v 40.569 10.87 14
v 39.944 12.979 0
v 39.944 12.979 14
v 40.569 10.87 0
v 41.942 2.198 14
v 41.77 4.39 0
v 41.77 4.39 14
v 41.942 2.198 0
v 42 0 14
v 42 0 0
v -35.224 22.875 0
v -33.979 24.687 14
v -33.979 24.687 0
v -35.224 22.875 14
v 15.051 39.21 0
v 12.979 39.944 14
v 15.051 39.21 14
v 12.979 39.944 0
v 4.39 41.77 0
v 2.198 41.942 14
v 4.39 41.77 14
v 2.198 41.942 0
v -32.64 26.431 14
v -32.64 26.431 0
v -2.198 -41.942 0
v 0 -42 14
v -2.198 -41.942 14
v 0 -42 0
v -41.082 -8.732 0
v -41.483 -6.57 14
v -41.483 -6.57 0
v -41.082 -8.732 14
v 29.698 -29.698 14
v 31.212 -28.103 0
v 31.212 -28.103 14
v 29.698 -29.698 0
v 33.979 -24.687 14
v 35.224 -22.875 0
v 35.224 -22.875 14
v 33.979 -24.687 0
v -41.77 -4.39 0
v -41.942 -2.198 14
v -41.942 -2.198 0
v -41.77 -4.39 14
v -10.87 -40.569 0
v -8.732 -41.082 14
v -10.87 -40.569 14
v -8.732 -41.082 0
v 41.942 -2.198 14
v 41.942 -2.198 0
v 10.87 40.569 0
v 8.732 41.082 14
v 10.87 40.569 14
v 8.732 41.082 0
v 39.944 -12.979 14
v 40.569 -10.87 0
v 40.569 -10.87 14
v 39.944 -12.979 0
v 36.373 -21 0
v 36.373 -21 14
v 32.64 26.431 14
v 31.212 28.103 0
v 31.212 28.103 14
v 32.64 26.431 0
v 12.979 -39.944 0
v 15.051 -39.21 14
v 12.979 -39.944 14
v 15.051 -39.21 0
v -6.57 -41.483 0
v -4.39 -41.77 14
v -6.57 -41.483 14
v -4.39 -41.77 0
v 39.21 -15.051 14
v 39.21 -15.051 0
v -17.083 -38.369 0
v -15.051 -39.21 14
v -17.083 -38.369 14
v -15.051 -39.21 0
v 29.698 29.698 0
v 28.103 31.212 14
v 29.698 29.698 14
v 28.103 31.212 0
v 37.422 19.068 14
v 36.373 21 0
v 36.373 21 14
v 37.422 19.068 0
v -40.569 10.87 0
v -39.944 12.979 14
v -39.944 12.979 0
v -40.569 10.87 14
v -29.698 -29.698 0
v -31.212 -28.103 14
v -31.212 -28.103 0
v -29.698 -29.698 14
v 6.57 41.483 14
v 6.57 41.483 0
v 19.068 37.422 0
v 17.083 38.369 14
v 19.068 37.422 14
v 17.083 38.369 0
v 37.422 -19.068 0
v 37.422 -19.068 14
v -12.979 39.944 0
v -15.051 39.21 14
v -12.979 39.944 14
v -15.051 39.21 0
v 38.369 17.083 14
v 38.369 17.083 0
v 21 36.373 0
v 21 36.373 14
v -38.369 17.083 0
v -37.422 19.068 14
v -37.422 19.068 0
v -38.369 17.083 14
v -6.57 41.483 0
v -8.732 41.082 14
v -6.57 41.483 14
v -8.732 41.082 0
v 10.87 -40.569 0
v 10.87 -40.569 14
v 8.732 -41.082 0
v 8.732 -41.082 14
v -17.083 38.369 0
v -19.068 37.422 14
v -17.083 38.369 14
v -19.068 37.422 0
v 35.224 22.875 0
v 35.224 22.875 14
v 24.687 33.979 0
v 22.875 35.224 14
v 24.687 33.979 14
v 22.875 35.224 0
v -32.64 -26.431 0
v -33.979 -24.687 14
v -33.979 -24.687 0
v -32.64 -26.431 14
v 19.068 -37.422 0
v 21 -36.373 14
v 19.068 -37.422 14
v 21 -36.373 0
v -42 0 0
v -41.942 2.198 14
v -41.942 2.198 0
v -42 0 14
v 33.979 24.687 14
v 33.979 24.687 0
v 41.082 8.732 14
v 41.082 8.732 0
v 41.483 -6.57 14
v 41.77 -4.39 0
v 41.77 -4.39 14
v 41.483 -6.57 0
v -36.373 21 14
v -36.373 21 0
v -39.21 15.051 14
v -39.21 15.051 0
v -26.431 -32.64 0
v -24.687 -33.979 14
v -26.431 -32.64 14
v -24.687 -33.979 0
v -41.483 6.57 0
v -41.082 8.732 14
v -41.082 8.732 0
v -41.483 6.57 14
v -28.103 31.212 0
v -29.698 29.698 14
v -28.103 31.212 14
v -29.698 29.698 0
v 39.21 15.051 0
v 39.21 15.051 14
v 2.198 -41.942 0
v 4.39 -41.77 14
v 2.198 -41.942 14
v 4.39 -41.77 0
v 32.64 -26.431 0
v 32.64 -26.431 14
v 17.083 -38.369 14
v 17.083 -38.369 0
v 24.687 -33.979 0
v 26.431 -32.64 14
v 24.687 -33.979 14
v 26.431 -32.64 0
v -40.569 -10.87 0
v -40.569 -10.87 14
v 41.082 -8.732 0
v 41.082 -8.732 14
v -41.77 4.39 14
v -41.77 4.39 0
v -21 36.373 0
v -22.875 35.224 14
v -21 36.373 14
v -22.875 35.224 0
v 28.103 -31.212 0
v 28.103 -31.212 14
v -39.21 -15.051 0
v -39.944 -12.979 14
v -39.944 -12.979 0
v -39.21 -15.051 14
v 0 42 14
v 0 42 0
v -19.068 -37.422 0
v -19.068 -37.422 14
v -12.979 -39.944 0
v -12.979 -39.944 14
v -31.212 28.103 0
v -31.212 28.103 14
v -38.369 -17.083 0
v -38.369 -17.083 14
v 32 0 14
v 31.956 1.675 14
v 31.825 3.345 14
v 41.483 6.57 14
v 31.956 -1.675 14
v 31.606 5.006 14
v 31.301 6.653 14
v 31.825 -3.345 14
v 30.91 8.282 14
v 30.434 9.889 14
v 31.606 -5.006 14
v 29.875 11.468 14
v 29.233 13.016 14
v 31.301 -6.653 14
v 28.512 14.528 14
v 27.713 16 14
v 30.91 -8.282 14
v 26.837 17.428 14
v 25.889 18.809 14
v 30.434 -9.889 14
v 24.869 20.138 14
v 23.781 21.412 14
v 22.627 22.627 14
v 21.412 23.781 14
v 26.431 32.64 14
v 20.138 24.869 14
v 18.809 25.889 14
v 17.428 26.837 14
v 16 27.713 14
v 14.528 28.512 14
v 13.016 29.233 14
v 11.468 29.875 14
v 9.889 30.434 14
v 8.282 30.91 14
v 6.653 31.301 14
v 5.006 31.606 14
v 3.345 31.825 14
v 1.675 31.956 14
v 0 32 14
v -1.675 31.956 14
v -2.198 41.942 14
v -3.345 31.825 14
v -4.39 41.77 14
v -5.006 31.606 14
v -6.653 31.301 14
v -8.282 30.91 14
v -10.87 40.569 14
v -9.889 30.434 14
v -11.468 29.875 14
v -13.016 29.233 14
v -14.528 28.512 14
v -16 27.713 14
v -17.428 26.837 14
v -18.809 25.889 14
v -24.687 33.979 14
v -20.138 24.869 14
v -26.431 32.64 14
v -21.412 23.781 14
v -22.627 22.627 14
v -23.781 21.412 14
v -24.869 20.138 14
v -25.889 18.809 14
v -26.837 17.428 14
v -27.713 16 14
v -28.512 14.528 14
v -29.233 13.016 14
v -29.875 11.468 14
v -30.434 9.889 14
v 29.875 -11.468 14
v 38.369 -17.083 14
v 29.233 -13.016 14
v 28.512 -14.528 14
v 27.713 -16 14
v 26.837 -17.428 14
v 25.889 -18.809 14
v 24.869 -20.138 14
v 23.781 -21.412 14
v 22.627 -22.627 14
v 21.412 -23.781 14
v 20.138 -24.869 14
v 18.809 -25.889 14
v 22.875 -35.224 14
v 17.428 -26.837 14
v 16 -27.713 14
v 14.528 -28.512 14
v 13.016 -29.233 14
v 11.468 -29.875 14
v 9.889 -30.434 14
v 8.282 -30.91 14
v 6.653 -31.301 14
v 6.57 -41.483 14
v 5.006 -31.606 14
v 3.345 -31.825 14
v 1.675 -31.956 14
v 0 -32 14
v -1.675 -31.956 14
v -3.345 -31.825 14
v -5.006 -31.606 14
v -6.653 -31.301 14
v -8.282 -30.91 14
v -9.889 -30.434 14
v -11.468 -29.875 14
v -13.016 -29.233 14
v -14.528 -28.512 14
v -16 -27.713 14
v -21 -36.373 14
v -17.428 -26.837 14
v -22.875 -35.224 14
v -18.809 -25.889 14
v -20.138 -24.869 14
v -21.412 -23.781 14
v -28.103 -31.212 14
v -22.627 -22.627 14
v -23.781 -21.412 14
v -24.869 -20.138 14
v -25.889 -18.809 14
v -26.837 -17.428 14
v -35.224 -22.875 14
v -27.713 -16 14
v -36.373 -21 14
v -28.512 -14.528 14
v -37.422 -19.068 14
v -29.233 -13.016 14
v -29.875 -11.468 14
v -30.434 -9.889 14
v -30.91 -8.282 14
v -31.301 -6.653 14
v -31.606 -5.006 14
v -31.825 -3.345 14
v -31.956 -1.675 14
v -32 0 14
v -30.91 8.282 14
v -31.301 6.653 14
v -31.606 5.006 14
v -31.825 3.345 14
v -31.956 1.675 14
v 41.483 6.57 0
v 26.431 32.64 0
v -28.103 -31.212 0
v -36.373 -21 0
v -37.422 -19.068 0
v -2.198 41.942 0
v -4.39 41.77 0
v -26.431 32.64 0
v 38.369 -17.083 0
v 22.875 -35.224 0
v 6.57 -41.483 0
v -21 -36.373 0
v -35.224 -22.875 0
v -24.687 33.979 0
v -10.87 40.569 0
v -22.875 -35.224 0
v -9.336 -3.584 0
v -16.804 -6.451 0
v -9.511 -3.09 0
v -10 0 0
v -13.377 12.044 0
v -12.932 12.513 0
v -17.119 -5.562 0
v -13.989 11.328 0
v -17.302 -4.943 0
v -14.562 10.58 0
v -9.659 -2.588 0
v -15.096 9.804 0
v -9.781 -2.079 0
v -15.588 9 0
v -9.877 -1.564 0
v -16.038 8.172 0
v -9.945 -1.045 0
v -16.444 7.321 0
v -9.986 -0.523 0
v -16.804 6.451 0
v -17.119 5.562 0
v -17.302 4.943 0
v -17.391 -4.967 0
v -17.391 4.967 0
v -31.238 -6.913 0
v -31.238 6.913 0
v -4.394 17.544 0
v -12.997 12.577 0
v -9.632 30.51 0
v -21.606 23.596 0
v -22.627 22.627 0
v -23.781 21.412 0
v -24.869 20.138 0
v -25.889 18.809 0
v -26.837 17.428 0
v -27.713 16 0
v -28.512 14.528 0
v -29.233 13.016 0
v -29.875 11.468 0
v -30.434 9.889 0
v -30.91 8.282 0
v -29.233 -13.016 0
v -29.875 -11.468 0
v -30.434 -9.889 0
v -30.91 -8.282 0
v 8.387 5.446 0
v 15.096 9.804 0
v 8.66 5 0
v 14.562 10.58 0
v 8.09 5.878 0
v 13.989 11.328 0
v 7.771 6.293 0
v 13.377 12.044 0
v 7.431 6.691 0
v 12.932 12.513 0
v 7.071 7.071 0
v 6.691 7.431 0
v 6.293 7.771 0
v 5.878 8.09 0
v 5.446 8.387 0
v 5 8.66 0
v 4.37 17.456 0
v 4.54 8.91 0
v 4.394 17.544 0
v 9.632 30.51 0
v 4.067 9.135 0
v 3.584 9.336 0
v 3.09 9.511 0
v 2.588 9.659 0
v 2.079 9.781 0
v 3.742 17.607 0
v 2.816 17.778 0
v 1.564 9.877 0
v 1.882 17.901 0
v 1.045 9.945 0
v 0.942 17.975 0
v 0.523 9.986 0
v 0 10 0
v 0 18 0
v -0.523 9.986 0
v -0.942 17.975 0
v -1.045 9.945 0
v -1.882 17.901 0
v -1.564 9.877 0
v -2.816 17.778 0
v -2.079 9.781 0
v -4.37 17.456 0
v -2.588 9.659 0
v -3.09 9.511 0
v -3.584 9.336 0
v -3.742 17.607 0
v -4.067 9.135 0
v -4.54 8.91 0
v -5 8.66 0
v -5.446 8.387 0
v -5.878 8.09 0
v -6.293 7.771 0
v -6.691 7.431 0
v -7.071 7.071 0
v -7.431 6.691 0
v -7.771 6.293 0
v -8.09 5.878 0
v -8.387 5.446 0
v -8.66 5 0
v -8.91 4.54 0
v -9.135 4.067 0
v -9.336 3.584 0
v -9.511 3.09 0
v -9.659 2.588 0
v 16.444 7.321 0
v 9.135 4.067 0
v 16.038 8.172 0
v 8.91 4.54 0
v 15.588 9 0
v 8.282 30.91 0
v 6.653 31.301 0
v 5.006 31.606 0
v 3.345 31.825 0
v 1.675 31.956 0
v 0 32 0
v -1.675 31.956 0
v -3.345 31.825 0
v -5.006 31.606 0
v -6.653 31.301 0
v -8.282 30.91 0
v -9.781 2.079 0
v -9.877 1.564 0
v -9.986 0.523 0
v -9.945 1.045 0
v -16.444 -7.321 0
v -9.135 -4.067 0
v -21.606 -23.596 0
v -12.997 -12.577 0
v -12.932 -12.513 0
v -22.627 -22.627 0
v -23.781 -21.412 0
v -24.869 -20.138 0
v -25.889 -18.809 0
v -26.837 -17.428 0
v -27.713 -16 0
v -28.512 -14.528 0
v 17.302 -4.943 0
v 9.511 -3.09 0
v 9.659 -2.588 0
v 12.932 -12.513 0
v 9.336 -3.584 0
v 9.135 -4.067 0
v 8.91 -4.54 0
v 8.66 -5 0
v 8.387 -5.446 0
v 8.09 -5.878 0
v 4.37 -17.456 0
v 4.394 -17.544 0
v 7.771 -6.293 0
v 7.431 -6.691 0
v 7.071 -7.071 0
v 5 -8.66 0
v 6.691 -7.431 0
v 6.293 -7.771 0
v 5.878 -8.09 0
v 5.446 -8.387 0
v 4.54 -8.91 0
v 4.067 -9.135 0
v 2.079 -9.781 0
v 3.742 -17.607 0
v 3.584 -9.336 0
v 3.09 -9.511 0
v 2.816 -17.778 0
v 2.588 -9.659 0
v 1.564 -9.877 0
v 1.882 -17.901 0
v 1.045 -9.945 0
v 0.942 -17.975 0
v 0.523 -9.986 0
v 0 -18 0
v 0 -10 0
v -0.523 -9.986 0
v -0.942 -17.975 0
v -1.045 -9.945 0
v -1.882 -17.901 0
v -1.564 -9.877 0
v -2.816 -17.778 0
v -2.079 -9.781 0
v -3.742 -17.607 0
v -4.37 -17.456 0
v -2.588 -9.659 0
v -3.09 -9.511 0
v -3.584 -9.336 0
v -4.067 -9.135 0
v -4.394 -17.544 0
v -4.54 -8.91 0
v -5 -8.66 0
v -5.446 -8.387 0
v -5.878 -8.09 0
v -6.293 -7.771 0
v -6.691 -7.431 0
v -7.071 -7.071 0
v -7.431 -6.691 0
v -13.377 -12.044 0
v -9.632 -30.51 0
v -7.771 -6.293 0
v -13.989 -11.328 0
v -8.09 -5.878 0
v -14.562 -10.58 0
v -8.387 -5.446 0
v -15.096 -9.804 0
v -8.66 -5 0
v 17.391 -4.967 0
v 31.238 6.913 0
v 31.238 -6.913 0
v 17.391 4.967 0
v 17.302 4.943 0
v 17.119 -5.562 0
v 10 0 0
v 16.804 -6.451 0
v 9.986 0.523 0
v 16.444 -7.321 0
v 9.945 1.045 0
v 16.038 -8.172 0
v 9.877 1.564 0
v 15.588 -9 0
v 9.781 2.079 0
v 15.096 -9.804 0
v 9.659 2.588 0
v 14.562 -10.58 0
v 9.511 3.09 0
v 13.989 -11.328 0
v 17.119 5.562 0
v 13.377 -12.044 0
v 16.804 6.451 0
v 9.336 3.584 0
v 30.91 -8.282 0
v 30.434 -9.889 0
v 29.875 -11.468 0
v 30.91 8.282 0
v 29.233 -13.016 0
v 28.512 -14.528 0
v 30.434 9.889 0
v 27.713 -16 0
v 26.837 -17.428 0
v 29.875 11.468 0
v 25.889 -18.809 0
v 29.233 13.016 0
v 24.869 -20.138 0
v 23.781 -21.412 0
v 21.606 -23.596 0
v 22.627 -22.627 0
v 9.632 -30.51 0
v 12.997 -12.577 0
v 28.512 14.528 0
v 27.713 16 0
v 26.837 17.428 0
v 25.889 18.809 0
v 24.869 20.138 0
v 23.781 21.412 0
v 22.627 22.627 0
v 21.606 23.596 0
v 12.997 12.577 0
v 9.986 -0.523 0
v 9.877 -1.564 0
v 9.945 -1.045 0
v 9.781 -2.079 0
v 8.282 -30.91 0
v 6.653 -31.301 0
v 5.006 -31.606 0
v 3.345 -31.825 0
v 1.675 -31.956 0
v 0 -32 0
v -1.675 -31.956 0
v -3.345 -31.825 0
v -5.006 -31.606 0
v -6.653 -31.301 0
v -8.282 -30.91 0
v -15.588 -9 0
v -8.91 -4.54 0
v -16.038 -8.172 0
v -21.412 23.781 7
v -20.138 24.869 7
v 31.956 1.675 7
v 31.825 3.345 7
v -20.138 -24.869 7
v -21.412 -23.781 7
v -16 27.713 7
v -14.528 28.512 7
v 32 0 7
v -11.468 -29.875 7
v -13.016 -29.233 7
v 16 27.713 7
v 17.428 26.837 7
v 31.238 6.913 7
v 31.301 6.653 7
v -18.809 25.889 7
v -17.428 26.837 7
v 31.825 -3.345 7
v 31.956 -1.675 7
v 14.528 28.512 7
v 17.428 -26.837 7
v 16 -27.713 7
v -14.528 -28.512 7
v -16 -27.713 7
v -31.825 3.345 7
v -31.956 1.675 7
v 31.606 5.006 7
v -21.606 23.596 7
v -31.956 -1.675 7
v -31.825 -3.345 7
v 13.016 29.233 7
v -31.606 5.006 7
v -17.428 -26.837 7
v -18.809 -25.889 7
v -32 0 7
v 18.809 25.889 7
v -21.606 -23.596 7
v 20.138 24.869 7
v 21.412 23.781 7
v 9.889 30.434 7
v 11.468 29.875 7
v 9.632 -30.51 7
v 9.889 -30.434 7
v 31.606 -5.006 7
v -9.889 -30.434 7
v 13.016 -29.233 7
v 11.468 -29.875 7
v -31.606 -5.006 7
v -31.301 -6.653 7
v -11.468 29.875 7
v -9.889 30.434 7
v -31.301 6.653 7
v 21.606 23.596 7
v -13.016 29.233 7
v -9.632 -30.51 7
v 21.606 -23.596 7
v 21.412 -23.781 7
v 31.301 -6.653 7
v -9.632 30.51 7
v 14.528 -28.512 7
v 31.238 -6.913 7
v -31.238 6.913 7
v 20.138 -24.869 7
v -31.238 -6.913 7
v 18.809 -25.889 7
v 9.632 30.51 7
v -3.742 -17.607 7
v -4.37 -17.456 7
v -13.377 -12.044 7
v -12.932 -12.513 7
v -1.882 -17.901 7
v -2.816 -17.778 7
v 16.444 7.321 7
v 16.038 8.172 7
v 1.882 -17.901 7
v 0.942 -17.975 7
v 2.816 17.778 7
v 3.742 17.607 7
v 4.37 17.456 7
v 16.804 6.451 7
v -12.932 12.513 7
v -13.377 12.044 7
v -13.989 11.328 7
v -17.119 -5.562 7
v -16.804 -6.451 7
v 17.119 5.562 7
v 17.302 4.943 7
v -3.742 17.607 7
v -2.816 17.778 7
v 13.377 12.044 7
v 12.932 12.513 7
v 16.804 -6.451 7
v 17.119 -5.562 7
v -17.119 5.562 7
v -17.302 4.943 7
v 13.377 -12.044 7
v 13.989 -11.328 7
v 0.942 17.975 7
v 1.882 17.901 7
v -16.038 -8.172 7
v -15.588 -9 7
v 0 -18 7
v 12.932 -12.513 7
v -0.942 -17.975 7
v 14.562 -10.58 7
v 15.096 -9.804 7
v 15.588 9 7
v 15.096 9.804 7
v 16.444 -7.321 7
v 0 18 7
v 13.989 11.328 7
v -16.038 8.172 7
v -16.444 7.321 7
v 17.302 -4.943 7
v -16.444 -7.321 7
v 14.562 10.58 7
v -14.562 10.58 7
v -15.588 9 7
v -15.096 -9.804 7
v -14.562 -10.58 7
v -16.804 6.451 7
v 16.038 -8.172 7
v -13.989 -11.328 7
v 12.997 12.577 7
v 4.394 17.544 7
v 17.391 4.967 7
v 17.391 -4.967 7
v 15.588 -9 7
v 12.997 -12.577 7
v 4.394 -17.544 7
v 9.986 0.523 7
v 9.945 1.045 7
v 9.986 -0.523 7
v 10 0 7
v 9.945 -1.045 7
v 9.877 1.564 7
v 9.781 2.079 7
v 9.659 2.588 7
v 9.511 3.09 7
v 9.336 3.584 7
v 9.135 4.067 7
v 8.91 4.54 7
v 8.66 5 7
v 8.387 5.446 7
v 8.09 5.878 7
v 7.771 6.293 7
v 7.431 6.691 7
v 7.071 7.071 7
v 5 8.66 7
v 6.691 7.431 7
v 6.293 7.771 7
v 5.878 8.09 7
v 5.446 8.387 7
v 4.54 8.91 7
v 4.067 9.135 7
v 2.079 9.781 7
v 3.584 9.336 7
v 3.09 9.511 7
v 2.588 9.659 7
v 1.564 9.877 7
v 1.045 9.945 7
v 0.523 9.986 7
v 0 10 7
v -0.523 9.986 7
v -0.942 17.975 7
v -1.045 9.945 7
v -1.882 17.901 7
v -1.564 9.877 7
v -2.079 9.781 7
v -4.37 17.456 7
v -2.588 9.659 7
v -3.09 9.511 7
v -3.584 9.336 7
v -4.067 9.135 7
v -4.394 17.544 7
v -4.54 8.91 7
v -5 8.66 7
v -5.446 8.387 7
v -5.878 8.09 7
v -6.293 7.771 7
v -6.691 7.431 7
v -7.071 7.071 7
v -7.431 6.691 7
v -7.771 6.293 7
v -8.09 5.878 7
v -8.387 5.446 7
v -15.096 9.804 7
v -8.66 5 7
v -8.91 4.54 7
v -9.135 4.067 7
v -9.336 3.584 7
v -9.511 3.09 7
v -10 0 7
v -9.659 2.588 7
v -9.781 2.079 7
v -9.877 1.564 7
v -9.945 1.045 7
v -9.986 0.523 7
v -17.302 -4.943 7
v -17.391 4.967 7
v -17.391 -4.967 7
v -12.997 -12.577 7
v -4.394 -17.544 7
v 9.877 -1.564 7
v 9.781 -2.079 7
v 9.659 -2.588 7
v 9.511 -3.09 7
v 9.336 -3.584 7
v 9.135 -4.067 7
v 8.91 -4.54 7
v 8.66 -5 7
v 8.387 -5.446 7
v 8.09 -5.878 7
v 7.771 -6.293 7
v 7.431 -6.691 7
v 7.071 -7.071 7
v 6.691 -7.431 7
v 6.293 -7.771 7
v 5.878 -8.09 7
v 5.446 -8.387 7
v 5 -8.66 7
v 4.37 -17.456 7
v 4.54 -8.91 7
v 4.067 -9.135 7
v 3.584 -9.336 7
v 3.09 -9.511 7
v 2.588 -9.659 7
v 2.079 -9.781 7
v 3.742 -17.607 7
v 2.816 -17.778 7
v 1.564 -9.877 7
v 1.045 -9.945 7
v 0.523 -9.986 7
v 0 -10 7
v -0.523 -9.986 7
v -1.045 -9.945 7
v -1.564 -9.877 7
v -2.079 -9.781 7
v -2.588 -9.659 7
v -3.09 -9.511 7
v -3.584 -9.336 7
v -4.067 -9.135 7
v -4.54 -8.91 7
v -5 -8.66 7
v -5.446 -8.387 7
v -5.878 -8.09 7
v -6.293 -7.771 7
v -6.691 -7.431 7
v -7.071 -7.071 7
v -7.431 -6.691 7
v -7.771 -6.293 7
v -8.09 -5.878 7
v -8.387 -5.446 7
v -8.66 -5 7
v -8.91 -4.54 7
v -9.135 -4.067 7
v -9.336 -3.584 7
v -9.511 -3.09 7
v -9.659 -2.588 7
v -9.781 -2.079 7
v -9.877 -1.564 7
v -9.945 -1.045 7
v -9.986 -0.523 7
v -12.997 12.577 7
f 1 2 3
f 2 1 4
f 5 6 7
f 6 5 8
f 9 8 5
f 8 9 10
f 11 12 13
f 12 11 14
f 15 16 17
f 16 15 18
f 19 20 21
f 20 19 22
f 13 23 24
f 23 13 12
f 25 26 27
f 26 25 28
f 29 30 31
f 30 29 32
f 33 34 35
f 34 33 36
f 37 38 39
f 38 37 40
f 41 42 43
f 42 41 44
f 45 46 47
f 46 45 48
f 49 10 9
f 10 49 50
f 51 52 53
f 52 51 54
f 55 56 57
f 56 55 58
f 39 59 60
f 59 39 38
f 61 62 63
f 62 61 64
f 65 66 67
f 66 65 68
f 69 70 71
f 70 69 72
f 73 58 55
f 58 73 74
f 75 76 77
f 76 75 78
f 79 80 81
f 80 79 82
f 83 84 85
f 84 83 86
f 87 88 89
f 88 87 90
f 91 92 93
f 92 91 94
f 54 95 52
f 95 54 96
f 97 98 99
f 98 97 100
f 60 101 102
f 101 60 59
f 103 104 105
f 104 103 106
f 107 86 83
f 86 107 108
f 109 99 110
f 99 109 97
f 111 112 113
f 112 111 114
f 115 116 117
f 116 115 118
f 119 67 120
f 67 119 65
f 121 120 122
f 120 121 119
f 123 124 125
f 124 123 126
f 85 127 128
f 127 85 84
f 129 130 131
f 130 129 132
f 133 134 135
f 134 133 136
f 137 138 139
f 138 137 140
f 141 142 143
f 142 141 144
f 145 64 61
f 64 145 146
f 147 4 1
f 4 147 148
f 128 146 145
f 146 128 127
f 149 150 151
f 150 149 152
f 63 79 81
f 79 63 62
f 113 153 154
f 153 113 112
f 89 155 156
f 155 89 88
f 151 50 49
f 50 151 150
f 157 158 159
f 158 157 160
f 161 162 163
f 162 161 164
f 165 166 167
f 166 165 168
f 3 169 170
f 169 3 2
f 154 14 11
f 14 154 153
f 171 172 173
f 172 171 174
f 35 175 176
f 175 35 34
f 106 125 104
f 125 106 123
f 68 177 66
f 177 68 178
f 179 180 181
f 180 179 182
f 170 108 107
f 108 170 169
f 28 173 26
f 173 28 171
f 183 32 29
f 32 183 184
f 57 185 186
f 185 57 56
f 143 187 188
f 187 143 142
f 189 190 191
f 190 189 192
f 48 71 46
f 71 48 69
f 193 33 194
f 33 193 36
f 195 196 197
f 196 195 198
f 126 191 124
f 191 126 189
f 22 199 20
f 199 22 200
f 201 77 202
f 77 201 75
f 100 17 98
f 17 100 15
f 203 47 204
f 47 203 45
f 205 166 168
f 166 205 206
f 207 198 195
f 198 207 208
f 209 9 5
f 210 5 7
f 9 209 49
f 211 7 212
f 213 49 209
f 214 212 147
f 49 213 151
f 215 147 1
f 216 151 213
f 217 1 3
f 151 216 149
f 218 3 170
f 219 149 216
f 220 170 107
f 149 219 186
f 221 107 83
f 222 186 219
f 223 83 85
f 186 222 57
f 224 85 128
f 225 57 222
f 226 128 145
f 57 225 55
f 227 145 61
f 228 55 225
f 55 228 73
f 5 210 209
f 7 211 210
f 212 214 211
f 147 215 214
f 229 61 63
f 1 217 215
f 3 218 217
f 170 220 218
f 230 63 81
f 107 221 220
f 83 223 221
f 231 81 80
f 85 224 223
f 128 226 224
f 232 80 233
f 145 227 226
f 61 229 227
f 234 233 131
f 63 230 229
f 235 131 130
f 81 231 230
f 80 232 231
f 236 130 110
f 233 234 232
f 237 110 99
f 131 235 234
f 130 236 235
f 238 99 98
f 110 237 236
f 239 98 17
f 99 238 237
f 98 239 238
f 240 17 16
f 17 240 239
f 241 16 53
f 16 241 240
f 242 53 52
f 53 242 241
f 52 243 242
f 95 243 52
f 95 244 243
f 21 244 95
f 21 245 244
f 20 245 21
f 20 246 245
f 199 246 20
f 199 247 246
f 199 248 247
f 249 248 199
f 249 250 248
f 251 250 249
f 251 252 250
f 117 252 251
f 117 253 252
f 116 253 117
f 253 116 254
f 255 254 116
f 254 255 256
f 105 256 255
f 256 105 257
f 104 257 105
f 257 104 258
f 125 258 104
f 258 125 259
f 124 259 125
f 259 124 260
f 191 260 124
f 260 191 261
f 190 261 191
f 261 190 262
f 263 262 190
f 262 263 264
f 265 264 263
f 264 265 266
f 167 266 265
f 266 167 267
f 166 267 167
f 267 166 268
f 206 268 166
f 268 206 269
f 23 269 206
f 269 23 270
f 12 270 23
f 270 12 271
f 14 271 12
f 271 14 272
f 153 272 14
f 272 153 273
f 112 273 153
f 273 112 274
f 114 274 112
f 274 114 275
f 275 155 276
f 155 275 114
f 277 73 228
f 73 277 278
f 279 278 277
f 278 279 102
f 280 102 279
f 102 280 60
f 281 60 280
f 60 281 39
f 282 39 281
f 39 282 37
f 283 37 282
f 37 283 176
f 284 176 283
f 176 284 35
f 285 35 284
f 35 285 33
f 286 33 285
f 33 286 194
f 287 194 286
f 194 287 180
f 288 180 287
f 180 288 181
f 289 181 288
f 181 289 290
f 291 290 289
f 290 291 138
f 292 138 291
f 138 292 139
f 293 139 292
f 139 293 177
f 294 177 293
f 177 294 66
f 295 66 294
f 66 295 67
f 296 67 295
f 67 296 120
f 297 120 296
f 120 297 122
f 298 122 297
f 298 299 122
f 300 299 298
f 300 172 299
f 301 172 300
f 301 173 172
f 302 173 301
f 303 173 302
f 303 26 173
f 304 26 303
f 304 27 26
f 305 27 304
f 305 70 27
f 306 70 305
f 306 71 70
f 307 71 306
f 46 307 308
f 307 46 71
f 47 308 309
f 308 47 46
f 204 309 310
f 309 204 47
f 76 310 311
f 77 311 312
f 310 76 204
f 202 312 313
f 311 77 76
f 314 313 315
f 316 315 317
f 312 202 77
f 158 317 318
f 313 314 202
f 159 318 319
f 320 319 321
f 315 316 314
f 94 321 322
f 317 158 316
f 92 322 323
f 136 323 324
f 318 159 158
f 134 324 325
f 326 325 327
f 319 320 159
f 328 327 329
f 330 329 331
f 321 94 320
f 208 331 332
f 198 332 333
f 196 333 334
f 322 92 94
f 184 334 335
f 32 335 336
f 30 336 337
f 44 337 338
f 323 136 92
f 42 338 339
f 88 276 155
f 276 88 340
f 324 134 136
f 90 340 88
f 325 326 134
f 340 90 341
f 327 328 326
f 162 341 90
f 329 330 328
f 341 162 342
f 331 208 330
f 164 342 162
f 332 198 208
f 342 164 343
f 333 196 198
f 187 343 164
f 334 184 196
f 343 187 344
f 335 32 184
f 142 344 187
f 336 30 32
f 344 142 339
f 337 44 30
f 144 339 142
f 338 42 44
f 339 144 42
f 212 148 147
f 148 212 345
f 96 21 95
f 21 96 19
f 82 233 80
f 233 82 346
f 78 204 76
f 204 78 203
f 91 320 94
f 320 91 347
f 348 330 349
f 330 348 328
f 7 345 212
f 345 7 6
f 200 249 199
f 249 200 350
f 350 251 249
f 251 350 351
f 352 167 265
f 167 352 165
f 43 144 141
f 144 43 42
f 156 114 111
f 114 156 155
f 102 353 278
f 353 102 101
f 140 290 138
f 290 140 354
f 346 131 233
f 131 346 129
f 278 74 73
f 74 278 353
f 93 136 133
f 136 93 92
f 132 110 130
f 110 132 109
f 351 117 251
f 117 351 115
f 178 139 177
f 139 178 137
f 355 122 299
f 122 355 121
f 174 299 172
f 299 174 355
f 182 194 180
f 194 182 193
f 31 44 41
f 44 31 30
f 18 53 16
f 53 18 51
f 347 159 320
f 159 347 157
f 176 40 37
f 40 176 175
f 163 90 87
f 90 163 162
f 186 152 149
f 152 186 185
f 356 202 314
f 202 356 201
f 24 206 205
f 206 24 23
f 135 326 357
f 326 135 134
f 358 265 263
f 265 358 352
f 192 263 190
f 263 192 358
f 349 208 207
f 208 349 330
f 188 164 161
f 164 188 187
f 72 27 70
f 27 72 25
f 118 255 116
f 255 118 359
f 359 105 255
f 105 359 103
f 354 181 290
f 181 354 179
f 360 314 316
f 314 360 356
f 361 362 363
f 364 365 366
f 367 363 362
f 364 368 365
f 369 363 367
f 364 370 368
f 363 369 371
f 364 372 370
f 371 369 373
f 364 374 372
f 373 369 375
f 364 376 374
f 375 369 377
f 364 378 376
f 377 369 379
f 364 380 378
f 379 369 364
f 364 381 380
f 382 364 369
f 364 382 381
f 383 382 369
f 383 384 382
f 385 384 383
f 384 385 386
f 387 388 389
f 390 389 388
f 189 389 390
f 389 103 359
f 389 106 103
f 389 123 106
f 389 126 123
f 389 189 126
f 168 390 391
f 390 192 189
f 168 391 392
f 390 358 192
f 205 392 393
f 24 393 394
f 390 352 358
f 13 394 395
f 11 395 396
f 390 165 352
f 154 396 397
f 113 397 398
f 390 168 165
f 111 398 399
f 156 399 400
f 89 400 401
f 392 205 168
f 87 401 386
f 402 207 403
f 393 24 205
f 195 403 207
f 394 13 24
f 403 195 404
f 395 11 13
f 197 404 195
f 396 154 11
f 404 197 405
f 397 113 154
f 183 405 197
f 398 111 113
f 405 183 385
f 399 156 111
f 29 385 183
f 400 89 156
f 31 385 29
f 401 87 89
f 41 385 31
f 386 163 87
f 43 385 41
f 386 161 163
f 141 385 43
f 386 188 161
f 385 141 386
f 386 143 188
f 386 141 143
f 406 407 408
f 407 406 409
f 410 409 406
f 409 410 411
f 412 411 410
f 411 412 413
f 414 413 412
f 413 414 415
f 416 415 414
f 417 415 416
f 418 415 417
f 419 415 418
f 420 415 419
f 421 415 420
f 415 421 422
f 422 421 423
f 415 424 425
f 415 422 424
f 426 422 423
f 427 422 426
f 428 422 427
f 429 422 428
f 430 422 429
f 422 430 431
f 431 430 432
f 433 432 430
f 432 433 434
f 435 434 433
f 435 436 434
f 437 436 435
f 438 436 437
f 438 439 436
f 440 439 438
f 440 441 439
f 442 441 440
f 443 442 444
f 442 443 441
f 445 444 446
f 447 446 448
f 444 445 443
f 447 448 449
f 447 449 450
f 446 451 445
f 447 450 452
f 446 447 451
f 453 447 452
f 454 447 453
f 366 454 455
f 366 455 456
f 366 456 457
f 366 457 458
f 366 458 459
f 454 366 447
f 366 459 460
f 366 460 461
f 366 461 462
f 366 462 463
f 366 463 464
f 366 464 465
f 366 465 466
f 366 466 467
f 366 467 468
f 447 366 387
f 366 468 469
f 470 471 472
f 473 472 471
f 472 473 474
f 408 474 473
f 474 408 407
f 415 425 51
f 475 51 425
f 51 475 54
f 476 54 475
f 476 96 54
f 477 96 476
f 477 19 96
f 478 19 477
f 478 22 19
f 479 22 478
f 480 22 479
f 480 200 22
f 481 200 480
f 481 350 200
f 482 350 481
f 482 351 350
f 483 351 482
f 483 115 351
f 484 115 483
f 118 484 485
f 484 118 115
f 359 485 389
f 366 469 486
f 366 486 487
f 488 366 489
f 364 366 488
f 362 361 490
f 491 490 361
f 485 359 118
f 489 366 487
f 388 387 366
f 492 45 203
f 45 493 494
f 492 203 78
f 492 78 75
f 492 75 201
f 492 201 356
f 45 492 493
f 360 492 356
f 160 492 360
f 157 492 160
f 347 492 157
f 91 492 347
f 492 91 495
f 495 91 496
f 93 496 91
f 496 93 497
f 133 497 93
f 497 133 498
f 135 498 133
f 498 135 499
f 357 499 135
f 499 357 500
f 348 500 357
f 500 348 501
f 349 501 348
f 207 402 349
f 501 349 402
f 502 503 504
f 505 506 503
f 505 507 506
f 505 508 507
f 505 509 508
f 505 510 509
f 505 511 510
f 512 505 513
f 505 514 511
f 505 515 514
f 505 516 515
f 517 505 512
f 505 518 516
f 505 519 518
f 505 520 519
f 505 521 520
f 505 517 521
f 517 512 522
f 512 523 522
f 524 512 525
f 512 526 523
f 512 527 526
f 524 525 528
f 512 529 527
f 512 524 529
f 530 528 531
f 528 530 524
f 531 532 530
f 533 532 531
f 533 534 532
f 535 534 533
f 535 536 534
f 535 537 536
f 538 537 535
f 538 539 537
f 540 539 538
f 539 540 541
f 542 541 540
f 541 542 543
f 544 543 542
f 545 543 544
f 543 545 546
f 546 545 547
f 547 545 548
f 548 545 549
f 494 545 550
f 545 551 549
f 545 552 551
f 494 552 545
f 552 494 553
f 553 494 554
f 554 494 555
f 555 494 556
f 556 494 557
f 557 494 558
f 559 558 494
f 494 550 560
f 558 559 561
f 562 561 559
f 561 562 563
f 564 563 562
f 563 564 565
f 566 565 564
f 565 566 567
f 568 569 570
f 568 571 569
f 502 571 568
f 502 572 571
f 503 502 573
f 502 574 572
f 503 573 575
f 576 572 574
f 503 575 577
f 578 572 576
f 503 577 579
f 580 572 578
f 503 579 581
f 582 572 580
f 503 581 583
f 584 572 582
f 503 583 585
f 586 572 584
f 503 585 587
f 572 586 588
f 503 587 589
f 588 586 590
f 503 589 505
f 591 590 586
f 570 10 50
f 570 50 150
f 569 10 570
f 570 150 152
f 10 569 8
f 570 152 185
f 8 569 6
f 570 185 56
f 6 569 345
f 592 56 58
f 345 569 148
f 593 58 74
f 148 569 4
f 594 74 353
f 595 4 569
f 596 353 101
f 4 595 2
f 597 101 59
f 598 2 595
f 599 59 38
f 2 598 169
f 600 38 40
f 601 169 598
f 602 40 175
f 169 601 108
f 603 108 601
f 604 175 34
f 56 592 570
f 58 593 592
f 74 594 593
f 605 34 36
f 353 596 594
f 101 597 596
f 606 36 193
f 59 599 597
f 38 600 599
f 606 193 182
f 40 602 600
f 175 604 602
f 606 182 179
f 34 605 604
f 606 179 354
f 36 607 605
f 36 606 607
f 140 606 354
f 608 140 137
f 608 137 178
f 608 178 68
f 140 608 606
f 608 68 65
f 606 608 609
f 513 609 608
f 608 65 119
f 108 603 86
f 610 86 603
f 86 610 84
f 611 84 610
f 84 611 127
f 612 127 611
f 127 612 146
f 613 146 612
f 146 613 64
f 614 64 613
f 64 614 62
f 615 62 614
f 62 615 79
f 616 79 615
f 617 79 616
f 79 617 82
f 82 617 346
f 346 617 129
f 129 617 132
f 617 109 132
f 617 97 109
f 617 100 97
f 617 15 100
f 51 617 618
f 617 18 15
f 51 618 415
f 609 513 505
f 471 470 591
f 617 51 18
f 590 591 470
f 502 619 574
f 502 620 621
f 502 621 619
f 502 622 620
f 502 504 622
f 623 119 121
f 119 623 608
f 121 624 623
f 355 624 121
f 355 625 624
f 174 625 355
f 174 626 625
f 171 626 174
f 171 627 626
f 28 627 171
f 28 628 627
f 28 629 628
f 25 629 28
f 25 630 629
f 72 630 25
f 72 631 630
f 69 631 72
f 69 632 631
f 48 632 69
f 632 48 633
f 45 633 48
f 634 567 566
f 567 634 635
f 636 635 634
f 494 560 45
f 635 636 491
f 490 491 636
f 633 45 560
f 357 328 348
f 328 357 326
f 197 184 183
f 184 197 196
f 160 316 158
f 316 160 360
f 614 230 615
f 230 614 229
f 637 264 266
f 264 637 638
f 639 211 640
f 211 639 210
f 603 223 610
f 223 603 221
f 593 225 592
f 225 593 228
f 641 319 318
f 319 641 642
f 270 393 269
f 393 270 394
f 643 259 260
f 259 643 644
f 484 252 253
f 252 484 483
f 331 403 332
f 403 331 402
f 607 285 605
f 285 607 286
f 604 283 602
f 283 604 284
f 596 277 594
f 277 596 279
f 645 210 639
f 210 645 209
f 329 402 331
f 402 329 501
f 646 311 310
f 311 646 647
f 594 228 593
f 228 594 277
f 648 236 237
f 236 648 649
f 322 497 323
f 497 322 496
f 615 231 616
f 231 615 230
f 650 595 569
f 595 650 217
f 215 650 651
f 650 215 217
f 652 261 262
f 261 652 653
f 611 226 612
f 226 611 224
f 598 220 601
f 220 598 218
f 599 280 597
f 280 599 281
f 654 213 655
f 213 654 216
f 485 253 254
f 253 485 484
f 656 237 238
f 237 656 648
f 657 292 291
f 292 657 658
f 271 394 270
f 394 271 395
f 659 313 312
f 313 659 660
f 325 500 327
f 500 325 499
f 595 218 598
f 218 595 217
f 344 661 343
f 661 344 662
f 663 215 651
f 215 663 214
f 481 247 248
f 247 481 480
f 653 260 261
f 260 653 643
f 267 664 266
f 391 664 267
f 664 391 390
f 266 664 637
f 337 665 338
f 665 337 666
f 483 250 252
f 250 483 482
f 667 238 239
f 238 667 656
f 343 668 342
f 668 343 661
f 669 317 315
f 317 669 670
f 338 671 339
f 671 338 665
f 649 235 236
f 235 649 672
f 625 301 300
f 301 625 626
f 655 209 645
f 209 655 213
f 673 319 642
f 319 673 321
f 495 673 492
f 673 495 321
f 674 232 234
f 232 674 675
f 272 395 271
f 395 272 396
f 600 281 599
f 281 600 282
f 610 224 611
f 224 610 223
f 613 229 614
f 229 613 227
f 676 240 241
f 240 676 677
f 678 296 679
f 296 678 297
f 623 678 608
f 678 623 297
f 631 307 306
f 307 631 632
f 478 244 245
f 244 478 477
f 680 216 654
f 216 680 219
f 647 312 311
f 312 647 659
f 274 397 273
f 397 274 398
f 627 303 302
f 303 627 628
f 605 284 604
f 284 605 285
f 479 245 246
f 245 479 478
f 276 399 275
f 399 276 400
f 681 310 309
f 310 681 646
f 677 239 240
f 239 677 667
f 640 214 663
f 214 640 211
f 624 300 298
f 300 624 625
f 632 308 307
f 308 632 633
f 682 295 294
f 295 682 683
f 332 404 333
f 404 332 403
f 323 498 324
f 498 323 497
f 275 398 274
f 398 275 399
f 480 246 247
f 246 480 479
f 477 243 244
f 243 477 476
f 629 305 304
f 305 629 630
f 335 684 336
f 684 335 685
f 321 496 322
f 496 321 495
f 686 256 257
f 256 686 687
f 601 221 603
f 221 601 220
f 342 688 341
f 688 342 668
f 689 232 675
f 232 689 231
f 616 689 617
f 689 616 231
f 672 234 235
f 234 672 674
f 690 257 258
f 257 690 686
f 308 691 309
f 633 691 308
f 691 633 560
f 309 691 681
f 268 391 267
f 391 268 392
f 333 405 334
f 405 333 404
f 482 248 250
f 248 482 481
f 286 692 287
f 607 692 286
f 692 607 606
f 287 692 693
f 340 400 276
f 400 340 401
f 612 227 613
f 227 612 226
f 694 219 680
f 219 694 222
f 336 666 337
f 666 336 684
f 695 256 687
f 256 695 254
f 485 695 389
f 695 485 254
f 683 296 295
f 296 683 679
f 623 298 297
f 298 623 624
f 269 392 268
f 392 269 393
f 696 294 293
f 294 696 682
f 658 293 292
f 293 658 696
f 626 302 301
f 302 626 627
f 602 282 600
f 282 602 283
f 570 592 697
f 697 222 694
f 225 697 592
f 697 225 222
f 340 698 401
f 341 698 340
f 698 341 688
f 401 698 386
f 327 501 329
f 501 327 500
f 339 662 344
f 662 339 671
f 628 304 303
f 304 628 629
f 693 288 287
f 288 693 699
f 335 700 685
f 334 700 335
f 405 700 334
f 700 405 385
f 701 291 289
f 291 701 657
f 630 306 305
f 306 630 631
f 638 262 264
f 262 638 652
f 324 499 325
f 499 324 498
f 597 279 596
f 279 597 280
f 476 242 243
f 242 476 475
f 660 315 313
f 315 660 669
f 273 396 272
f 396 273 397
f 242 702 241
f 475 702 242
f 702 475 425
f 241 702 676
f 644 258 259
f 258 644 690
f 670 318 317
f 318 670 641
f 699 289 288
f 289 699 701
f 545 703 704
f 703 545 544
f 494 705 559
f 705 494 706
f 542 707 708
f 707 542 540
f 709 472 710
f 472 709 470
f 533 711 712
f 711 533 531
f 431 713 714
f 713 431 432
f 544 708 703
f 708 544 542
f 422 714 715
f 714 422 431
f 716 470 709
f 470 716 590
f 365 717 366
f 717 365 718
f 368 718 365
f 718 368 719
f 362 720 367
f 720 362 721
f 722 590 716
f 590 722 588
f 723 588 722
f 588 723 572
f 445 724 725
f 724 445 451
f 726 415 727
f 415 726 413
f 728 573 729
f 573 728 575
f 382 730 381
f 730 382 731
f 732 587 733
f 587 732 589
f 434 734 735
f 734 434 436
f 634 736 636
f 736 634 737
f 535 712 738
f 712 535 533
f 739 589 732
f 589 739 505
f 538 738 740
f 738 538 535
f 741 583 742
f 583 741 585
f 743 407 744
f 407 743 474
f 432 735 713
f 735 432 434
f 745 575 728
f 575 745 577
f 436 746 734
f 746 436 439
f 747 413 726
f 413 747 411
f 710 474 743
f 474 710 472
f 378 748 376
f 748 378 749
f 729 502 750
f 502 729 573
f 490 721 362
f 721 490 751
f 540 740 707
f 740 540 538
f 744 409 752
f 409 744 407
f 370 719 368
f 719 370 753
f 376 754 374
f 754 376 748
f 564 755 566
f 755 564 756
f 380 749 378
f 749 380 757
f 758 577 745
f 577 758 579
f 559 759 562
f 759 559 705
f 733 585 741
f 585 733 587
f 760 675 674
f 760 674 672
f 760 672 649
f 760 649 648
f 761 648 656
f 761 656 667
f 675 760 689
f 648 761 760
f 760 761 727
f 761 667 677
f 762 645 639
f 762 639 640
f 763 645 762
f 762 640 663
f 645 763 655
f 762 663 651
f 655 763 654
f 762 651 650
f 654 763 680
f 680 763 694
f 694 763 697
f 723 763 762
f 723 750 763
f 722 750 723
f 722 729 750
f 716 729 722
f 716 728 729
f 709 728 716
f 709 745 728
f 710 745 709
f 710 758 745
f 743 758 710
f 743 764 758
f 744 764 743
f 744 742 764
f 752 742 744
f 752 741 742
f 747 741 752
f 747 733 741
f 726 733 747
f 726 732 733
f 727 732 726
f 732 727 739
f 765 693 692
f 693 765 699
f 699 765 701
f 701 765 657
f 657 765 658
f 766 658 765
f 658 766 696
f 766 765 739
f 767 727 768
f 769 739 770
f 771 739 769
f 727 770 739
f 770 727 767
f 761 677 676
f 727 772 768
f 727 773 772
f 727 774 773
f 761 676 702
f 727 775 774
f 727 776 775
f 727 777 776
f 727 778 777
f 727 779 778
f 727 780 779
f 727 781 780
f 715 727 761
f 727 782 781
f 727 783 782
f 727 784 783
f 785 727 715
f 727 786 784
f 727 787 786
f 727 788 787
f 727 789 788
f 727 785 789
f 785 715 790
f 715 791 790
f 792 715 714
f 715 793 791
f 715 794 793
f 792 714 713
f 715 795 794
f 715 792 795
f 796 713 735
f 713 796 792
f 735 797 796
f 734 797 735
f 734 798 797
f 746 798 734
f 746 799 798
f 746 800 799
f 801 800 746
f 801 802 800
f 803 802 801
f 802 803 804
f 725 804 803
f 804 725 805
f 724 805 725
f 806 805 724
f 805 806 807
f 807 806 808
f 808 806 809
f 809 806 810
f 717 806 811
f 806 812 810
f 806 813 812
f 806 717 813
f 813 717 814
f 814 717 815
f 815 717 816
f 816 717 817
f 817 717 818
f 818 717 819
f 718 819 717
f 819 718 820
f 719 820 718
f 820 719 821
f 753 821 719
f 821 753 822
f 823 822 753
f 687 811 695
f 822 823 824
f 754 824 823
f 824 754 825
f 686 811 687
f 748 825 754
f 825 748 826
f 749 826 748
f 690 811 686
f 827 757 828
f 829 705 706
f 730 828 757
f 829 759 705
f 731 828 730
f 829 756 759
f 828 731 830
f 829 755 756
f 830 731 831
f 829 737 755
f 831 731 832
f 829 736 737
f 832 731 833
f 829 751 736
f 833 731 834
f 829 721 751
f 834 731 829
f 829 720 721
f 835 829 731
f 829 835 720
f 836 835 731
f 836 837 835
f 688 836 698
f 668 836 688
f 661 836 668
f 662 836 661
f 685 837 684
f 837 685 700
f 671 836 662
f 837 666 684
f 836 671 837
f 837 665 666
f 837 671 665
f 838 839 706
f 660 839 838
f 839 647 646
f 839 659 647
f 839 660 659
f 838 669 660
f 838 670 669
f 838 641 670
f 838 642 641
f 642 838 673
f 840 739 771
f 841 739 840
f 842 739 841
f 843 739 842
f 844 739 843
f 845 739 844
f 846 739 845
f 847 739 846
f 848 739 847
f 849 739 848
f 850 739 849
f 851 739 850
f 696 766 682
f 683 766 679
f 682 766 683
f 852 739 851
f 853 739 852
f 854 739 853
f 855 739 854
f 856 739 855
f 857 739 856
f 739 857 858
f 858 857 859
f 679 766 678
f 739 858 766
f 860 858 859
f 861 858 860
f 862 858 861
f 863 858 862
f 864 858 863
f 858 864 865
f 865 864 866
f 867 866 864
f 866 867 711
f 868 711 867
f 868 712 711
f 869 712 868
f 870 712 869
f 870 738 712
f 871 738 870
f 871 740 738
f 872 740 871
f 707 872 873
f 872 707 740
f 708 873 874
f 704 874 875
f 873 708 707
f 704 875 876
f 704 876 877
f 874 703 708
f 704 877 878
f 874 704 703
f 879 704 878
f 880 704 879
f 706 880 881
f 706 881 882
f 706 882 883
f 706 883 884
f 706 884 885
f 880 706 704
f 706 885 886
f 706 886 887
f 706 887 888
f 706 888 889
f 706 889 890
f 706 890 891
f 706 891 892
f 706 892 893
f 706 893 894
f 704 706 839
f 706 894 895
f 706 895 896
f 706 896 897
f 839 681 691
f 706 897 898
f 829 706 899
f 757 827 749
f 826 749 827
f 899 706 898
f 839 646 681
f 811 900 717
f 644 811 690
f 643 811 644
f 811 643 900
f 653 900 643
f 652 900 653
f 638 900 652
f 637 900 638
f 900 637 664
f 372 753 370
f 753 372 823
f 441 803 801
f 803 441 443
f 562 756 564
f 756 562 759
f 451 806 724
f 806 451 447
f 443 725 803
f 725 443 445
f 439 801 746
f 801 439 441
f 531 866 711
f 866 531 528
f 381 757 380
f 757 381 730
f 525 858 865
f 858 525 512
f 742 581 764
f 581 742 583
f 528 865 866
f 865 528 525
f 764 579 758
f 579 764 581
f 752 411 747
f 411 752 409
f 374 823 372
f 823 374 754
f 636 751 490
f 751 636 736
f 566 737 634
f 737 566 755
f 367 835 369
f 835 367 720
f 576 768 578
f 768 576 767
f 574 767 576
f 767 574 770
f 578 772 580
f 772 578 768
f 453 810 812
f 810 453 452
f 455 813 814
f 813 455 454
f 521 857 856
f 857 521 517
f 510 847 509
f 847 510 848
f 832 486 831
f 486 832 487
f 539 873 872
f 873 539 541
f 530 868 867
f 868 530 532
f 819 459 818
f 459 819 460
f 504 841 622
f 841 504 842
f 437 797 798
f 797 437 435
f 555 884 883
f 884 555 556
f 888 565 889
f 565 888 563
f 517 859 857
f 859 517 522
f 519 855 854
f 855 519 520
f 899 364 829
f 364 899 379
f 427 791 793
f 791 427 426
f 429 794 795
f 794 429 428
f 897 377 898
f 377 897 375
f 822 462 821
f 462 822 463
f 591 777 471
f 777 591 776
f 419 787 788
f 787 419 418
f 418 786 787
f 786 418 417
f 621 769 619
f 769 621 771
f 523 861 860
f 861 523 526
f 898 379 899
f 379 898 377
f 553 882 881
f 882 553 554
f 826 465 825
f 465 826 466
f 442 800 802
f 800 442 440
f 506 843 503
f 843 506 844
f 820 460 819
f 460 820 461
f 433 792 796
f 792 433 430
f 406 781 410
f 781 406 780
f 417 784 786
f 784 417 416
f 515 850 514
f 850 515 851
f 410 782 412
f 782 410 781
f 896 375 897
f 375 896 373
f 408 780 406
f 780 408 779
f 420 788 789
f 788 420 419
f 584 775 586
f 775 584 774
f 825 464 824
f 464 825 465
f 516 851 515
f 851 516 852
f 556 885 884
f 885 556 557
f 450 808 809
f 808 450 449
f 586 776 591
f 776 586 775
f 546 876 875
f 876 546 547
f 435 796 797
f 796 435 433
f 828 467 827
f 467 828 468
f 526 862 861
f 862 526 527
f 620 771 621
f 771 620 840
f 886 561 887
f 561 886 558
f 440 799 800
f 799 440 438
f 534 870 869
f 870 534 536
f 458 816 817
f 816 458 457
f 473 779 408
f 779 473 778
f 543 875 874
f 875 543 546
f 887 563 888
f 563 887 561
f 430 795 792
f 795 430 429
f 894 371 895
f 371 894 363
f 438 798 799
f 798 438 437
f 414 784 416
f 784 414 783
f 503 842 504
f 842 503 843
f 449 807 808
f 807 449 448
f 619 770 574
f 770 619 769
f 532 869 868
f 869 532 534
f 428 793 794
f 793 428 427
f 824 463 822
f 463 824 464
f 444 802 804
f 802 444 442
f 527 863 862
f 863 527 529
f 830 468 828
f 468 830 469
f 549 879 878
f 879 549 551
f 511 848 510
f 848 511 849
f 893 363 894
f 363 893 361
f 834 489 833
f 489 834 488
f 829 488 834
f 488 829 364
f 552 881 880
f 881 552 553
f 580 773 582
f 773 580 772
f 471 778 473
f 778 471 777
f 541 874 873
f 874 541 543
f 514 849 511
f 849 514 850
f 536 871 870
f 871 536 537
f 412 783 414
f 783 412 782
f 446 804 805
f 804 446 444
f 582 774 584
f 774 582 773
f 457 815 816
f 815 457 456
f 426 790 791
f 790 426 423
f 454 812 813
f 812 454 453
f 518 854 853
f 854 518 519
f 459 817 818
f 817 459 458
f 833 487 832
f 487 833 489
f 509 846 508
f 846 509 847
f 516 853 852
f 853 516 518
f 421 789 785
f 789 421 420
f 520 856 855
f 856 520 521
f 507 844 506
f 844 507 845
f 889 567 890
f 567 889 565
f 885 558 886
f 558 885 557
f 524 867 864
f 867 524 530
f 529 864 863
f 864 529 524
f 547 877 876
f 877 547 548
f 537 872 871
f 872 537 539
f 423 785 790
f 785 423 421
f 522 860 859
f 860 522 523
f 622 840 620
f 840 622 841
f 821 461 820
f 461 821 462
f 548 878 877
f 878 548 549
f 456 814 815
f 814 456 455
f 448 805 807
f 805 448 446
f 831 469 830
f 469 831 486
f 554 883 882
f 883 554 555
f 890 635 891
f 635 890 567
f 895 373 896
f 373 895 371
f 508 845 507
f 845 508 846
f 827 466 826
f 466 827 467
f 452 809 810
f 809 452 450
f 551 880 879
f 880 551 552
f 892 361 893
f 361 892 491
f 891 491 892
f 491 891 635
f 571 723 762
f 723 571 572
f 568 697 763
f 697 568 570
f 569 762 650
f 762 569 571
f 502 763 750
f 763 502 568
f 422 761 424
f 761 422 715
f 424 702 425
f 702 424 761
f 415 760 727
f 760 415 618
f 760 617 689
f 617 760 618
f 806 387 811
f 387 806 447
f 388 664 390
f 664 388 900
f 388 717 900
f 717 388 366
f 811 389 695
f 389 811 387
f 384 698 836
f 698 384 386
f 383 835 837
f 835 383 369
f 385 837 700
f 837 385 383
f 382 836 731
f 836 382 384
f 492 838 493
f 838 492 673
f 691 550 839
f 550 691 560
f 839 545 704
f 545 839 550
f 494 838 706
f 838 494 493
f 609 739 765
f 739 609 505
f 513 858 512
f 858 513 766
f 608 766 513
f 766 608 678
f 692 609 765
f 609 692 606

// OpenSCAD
// ============================================================
// Annular Rim with Collar, Radial Ribs & Stepped Profile
// ============================================================

// --- Outer Rim (tallest tier) ---
outer_r         = 42;      // Outer radius of the rim
rim_width       = 10;      // Radial width of the outer rim wall
rim_height      = 14;      // Full height of outer rim

// --- Central Collar (shorter tier) ---
collar_outer_r  = 18;      // Outer radius of the collar
collar_inner_r  = 10;      // Center bore radius (open center)
collar_height   = 7;       // Height of collar (shorter than rim)

// --- Radial Ribs (shorter tier, same as collar) ---
num_ribs        = 6;        // Number of radial ribs
rib_angular_w   = 16;       // Angular width of each rib (degrees)
rib_height      = 7;        // Height of rib web (matches collar tier)

// --- Window Slot Corner Radius ---
slot_corner_r   = 2.5;      // Corner radius on rib edges / window slots

// --- Resolution ---
$fn = 120;

// Derived: inner edge of the outer rim
rim_inner_r = outer_r - rim_width;

// ---------------------------------------------------------
// Module: 2D rib profile with rounded corners
// Creates a sector-like shape spanning from r_in to r_out
// with the given angular width and corner radius.
// The rounded corners produce the slot-like window spaces
// between adjacent ribs.
// ---------------------------------------------------------
module rib_profile(r_in, r_out, ang_width, cr) {
    half_aw = ang_width / 2;
    hull() {
        for (r = [r_in, r_out]) {
            for (a = [-half_aw, half_aw]) {
                translate([r * cos(a), r * sin(a)])
                    circle(r = cr, $fn = 36);
            }
        }
    }
}

// ---------------------------------------------------------
// Main Model Assembly
// ---------------------------------------------------------
union() {
    // 1) Outer rim — tall annular ring, open center
    difference() {
        cylinder(r = outer_r, h = rim_height);
        translate([0, 0, -0.05])
            cylinder(r = rim_inner_r, h = rim_height + 0.1);
    }

    // 2) Central collar — shorter concentric annular ring, open bore
    difference() {
        cylinder(r = collar_outer_r, h = collar_height);
        translate([0, 0, -0.05])
            cylinder(r = collar_inner_r, h = collar_height + 0.1);
    }

    // 3) Radial ribs — connect collar to rim at the shorter tier
    //    Rounded corners on the rib profiles create the rounded
    //    slot-like window spaces between adjacent ribs.
    for (i = [0 : num_ribs - 1]) {
        rotate([0, 0, i * 360 / num_ribs])
            linear_extrude(height = rib_height)
                rib_profile(
                    r_in      = collar_outer_r,
                    r_out     = rim_inner_r,
                    ang_width = rib_angular_w,
                    cr        = slot_corner_r
                );
    }
}
